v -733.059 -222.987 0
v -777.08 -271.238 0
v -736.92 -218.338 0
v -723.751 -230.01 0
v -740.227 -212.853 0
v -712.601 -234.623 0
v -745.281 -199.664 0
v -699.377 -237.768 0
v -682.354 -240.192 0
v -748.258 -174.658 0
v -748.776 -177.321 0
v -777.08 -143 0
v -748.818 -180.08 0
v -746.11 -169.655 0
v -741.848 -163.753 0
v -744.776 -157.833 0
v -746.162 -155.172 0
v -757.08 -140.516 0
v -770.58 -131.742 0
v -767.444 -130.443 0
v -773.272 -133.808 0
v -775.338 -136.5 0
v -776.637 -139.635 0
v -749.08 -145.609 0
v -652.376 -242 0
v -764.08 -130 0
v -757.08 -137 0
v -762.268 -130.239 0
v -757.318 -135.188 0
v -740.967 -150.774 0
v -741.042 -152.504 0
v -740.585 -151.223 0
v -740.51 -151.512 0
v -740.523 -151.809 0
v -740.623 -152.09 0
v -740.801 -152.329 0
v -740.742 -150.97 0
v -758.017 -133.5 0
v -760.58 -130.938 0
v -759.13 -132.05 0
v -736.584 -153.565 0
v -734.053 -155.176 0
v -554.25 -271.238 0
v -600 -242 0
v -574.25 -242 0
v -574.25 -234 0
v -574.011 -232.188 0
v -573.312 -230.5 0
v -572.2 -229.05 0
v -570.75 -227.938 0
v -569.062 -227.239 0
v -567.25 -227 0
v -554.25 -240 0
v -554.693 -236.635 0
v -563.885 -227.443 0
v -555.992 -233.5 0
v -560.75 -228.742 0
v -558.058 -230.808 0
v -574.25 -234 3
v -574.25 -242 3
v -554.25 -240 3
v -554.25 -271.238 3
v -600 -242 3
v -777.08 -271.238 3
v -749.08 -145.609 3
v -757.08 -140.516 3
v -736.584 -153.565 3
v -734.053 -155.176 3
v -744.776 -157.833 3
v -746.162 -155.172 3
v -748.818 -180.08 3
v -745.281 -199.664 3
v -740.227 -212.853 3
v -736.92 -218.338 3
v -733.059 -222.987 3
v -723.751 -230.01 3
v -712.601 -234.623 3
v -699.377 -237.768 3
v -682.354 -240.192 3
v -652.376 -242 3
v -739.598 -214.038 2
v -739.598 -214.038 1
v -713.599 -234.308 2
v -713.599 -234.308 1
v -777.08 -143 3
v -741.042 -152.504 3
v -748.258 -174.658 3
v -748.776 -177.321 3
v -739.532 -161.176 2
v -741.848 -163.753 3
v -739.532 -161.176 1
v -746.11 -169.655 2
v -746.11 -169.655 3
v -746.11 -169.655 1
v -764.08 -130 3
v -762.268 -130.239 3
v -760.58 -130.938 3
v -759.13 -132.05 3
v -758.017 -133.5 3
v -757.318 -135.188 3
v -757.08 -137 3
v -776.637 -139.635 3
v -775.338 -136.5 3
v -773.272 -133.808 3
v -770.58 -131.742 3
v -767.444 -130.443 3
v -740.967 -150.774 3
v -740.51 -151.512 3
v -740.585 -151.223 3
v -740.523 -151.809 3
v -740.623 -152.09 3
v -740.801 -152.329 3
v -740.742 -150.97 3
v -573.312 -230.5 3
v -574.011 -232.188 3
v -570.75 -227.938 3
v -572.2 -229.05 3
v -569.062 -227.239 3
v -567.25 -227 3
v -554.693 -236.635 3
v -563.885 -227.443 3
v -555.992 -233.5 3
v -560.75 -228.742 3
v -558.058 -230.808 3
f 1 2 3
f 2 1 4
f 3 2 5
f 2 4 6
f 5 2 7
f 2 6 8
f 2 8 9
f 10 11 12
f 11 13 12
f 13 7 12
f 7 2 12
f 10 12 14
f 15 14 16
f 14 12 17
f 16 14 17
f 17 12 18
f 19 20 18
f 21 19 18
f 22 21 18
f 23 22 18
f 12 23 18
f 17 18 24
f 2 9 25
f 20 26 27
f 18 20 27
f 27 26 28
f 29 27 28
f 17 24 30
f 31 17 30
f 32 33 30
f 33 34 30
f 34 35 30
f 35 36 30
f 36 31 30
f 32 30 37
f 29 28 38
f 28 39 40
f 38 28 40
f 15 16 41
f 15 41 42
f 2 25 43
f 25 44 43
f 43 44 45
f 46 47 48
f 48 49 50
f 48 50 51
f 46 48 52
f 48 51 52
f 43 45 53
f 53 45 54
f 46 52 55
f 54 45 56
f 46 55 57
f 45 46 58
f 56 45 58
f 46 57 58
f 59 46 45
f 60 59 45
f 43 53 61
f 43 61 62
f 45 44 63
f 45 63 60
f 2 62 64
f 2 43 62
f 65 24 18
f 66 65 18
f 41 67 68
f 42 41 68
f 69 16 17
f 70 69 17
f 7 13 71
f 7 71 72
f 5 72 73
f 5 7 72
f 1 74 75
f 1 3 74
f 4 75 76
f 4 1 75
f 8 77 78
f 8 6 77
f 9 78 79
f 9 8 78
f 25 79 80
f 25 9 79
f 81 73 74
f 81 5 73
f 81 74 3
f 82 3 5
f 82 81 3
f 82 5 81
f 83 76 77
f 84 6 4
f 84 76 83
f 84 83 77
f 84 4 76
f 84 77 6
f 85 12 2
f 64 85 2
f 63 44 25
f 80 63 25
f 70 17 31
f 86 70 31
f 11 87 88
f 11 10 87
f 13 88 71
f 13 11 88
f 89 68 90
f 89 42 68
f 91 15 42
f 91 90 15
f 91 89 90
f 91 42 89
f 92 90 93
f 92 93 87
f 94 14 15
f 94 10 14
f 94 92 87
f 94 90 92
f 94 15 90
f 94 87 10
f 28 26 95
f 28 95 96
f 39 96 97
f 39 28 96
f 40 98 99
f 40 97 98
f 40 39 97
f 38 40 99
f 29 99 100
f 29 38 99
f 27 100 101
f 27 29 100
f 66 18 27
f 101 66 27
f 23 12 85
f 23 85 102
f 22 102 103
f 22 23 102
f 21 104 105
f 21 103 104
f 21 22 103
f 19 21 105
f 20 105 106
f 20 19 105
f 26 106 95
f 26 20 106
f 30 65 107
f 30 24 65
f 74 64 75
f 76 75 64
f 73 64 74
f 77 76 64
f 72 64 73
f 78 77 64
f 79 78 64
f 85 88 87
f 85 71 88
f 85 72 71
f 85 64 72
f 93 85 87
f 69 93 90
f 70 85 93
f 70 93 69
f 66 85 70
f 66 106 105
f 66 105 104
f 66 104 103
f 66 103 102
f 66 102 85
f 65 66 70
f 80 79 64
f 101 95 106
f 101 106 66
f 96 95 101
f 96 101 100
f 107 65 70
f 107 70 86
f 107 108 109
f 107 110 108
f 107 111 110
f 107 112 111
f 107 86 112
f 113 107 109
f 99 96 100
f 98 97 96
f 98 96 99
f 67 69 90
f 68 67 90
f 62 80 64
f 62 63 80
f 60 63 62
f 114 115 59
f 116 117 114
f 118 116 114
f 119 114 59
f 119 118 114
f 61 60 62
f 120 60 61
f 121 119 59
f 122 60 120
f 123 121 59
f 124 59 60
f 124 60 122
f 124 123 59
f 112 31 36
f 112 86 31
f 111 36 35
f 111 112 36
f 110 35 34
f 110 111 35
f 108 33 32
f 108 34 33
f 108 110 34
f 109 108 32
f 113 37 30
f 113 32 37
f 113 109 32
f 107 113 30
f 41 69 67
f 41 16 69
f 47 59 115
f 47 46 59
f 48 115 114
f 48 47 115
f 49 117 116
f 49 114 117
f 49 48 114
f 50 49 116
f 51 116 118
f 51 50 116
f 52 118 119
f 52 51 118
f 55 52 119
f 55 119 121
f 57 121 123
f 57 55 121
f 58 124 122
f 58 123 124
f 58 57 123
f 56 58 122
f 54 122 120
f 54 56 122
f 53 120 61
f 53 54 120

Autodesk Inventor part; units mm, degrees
ref_plane "YZ Plane" through (0, 0, 0) normal (1, 0, 0) x (0, 1, 0)
ref_plane "XZ Plane" through (0, 0, 0) normal (0, 1, 0) x (-1, 0, 0)
ref_plane "XY Plane" through (0, 0, 0) normal (0, 0, 1) x (1, 0, 0)
sketch "Sketch3" plane through (0, 0, 0) normal (0, 0, 1) x (1, 0, 0)
  circle A0 centre (368.0481, 50) radius 50 construction
  line L0 (368.0481, 0) -> (514.9541, 0) construction
  line L1 (368.0481, 50) -> (514.9541, 50) construction
  line L2 (368.0481, 100) -> (514.9541, 100) construction
  line L3 (368.0481, 50) -> (343.0481, 6.6987) construction
  line L4 (368.0481, 50) -> (324.7469, 25) construction
  line L5 (368.0481, 50) -> (324.7469, 75) construction
  line L6 (343.0481, 93.3013) -> (368.0481, 50) construction
  line L7 (393.0481, 93.3013) -> (368.0481, 50) construction
  line L8 (411.3494, 75) -> (368.0481, 50) construction
  line L9 (411.3494, 25) -> (368.0481, 50) construction
  line L10 (393.0481, 6.6987) -> (368.0481, 50) construction
  line L11 (368.0481, 0) -> (368.0481, 100) construction
  line L12 (418.0481, 50) -> (368.0481, 50) construction
  line L13 (341.8682, 0) -> (341.8682, 100) construction
  line L14 (315.6883, 0) -> (315.6883, 100) construction
  line L15 (289.5083, 0) -> (289.5083, 100) construction
  line L16 (263.3284, 0) -> (263.3284, 100) construction
  line L17 (237.1485, 0) -> (237.1485, 100) construction
  line L18 (210.9685, 0) -> (210.9685, 100) construction
  line L19 (184.7886, 0) -> (184.7886, 100) construction
  line L20 (158.6086, 0) -> (158.6086, 100) construction
  circle A1 centre (315.6883, 50) radius 50 construction
  circle A2 centre (341.8682, 50) radius 50 construction
  circle A3 centre (289.5083, 50) radius 50 construction
  circle A4 centre (263.3284, 50) radius 50 construction
  circle A5 centre (237.1485, 50) radius 50 construction
  circle A6 centre (210.9685, 50) radius 50 construction
  line L21 (393.0481, 6.6987) -> (514.9541, 6.6987) construction
  line L22 (411.3494, 25) -> (514.9541, 25) construction
  line L23 (411.3494, 75) -> (514.9541, 75) construction
  line L24 (411.3494, 75) -> (514.9541, 75) construction
  line L25 (393.0481, 93.3013) -> (514.9541, 93.3013) construction
  line L26 (358.9895, 75) -> (339.5083, 50) construction
  line L27 (339.5083, 50) -> (306.6297, 25) construction
  line L28 (306.6297, 25) -> (262.1485, 6.6987) construction
  line L29 (262.1485, 6.6987) -> (210.9685, 0) construction
  line L30 (105.4843, -12.0642) -> (105.4843, 125.3083) construction
  line L31 (25.75, 0) -> (25.75, 23)
  line L32 (45.75, 17) -> (45.75, -21.2379)
  arc A7 (32.75, 30) -> (25.75, 23) centre (32.75, 23) ccw
  arc A8 (45.75, 17) -> (32.75, 30) centre (32.75, 17) ccw
  line L33 (32.75, 17) -> (45.75, 17) construction
  line L34 (32.75, 17) -> (32.75, 30) construction
  arc A9 (0, 0) -> (8.875, -12.2379) centre (12.875, 0) ccw
  arc A10 (16.875, -12.2379) -> (25.75, 0) centre (12.875, 0) ccw
  line L35 (45.75, -21.2379) -> (16.875, -21.2379)
  line L36 (8.875, -21.2379) -> (-177.0796, -21.2379)
  circle A11 centre (-144.2046, 110.3653) radius 12.875 construction
  line L37 (8.875, -21.2379) -> (8.875, -12.2379)
  line L38 (16.875, -21.2379) -> (16.875, -12.2379)
  line L39 (411.3494, 75) -> (158.6086, 75) construction
  line L40 (368.0481, 100) -> (158.6086, 100) construction
  line L41 (418.0481, 50) -> (158.6086, 50) construction
  line L42 (411.3494, 25) -> (158.6086, 25) construction
  line L43 (393.0481, 6.6987) -> (158.6086, 6.6987) construction
  line L44 (393.0481, 93.3013) -> (158.6086, 93.3013) construction
  line L45 (358.9895, 75) -> (366.8682, 93.3013) construction
  line L46 (366.8682, 93.3013) -> (368.0481, 100) construction
  spline S0 degree 4 poles (-157.0796, 100) (-157.0796, 88.9946) (-147.011, 72.6811) (-131.8577, 48.7932) (-88.4777, 17.6268) (-50.0176, 3.937) (-18.8717, 0) (0, 0) knots 0 0 0 0 0 0.264547 0.457223 0.66608 1 1 1 1 1
  line L47 (-157.0796, 100) -> (-157.0796, 81.2146) construction
  line L48 (0, 0) -> (-42.8818, 0) construction
  line L49 (-157.0796, 100) -> (-157.0796, 113)
  line L50 (-144.2046, 110.3653) -> (-157.0796, 110.3653) construction
  line L51 (-147.6984, 94.0277) -> (-120.1158, 108.3975) construction
  line L52 (-157.0796, 100) -> (0, 0) construction
  circle A12 centre (-147.2046, 105.4197) radius 9.875 construction
  line L53 (-147.2046, 105.4197) -> (-157.0796, 105.4197) construction
  line L54 (-146.1623, 94.828) -> (-144.7762, 92.1674) construction
  line L55 (-144.7762, 92.1674) -> (-142.2689, 93.4736) construction
  line L56 (-177.0796, 107) -> (-177.0796, -21.2379)
  arc A13 (-157.0796, 113) -> (-164.0796, 120) centre (-164.0796, 113) ccw
  line L57 (-164.0796, 113) -> (-164.0796, 120) construction
  line L58 (-164.0796, 113) -> (-157.0796, 113) construction
  arc A14 (-164.0796, 120) -> (-177.0796, 107) centre (-164.0796, 107) ccw
  line L59 (-164.0796, 107) -> (-177.0796, 107) construction
  line L60 (-164.0796, 107) -> (-164.0796, 120) construction
  line L61 (-457.0796, 100) -> (-300, 0)
  line L62 (-757.0796, 100) -> (-757.0796, 76.4376)
  line L63 (-600, 0) -> (-652.3765, 0)
  spline S1 degree 4 poles (-757.0796, 76.4376) (-757.0796, 65.0585) (-753.7776, 47.1407) (-745.4013, 7.8331) (-693.0053, 2.4317) (-668.8587, 0) (-652.3765, 0) knots 0 0 0 0 0 0.348765 0.598765 1 1 1 1 1
  line L64 (-477.0796, 107) -> (-477.0796, -21.2379)
  arc A15 (-464.0796, 120) -> (-477.0796, 107) centre (-464.0796, 107) ccw
  arc A16 (-457.0796, 113) -> (-464.0796, 120) centre (-464.0796, 113) ccw
  line L65 (-457.0796, 100) -> (-457.0796, 113)
  circle A17 centre (-447.2046, 105.4197) radius 9.875 construction
  circle A18 centre (-444.2046, 110.3653) radius 12.875 construction
  line L66 (-457.0796, 100) -> (-300, 0) construction
  line L67 (-447.6984, 94.0277) -> (-420.1158, 108.3975) construction
  line L68 (-444.7762, 92.1674) -> (-442.2689, 93.4736) construction
  line L69 (-446.1623, 94.828) -> (-444.7762, 92.1674) construction
  line L70 (-291.125, -21.2379) -> (-477.0796, -21.2379)
  arc A19 (-300, 0) -> (-291.125, -12.2379) centre (-287.125, 0) ccw
  line L71 (-291.125, -21.2379) -> (-291.125, -12.2379)
  line L72 (-283.125, -21.2379) -> (-283.125, -12.2379)
  arc A20 (-283.125, -12.2379) -> (-274.25, 0) centre (-287.125, 0) ccw
  line L73 (-254.25, -21.2379) -> (-283.125, -21.2379)
  line L74 (-254.25, 17) -> (-254.25, -21.2379)
  line L75 (-274.25, 0) -> (-274.25, 23)
  arc A21 (-267.25, 30) -> (-274.25, 23) centre (-267.25, 23) ccw
  arc A22 (-254.25, 17) -> (-267.25, 30) centre (-267.25, 17) ccw
  line L76 (-777.0796, 107) -> (-777.0796, -21.2379)
  arc A23 (-764.0796, 120) -> (-777.0796, 107) centre (-764.0796, 107) ccw
  arc A24 (-757.0796, 113) -> (-764.0796, 120) centre (-764.0796, 113) ccw
  line L77 (-757.0796, 100) -> (-757.0796, 113)
  circle A25 centre (-747.2046, 105.4197) radius 9.875 construction
  circle A26 centre (-744.2046, 110.3653) radius 12.875 construction
  line L78 (-757.0796, 100) -> (-600, 0) construction
  line L79 (-747.6984, 94.0277) -> (-720.1158, 108.3975) construction
  line L80 (-744.7762, 92.1674) -> (-742.2689, 93.4736) construction
  line L81 (-746.1623, 94.828) -> (-744.7762, 92.1674) construction
  line L82 (-591.125, -21.2379) -> (-777.0796, -21.2379)
  arc A27 (-600, 0) -> (-591.125, -12.2379) centre (-587.125, 0) ccw
  line L83 (-591.125, -21.2379) -> (-591.125, -12.2379)
  line L84 (-583.125, -21.2379) -> (-583.125, -12.2379)
  arc A28 (-583.125, -12.2379) -> (-574.25, 0) centre (-587.125, 0) ccw
  line L85 (-554.25, -21.2379) -> (-583.125, -21.2379)
  line L86 (-554.25, 17) -> (-554.25, -21.2379)
  line L87 (-574.25, 0) -> (-574.25, 23)
  arc A29 (-567.25, 30) -> (-574.25, 23) centre (-567.25, 23) ccw
  arc A30 (-554.25, 17) -> (-567.25, 30) centre (-567.25, 17) ccw
  line L88 (32.75, -233) -> (45.75, -233) construction
  line L89 (32.75, -233) -> (32.75, -220) construction
  arc A31 (45.75, -233) -> (32.75, -220) centre (32.75, -233) ccw construction
  line L90 (25.75, -250) -> (25.75, -227) construction
  line L91 (45.75, -233) -> (45.75, -271.2379) construction
  arc A32 (16.875, -262.2379) -> (25.75, -250) centre (12.875, -250) ccw construction
  line L92 (45.75, -271.2379) -> (16.875, -271.2379) construction
  arc A33 (0, -250) -> (8.875, -262.2379) centre (12.875, -250) ccw construction
  arc A34 (32.75, -220) -> (25.75, -227) centre (32.75, -227) ccw construction
  line L93 (8.875, -271.2379) -> (-177.0796, -271.2379) construction
  line L94 (-157.0796, -150) -> (0, -250) construction
  spline S2 degree 4 poles (-157.0796, -150) (-157.0796, -161.0054) (-147.011, -177.3189) (-131.8577, -201.2068) (-88.4777, -232.3732) (-50.0176, -246.063) (-18.8717, -250) (0, -250) knots 0 0 0 0 0 0.264547 0.457223 0.66608 1 1 1 1 1 construction
  line L95 (-177.0796, -143) -> (-177.0796, -271.2379)
  line L96 (-146.1623, -155.172) -> (-144.7762, -157.8326) construction
  line L97 (-144.7762, -157.8326) -> (-142.2689, -156.5264) construction
  line L98 (-147.6984, -155.9723) -> (-120.1158, -141.6025) construction
  line L99 (-157.0796, -150) -> (-157.0796, -168.7854) construction
  line L100 (-147.2046, -144.5803) -> (-157.0796, -144.5803) construction
  line L101 (-144.2046, -139.6347) -> (-157.0796, -139.6347) construction
  circle A35 centre (-147.2046, -144.5803) radius 9.875 construction
  line L102 (0, -250) -> (-42.8818, -250) construction
  line L103 (16.875, -271.2379) -> (16.875, -262.2379) construction
  line L104 (8.875, -271.2379) -> (8.875, -262.2379) construction
  circle A36 centre (-144.2046, -139.6347) radius 12.875 construction
  line L105 (-164.0796, -143) -> (-177.0796, -143) construction
  line L106 (-157.0796, -150) -> (-157.0796, -137) construction
  line L107 (-164.0796, -137) -> (-157.0796, -137) construction
  arc A37 (-157.0796, -137) -> (-164.0796, -130) centre (-164.0796, -137) ccw
  line L108 (-164.0796, -137) -> (-164.0796, -130) construction
  line L109 (-164.0796, -143) -> (-164.0796, -130) construction
  arc A38 (-164.0796, -130) -> (-177.0796, -143) centre (-164.0796, -143) ccw
  arc A39 (32.75, -227) -> (25.75, -234) centre (32.75, -234) ccw
  line L110 (32.75, -234) -> (25.75, -234) construction
  line L111 (32.75, -234) -> (32.75, -227) construction
  line L112 (45.75, -271.2379) -> (-177.0796, -271.2379)
  arc A40 (45.75, -240) -> (32.75, -227) centre (32.75, -240) ccw
  line L113 (32.75, -240) -> (45.75, -240) construction
  line L114 (32.75, -240) -> (32.75, -227) construction
  line L115 (45.75, -240) -> (45.75, -271.2379)
  line L116 (0, -242) -> (25.75, -242)
  line L117 (25.75, -234) -> (25.75, -242)
  line L118 (-149.0796, -145.6094) -> (-149.0796, -150)
  line L119 (-149.0796, -145.6094) -> (-157.0796, -140.5164)
  line L120 (-157.0796, -140.5164) -> (-157.0796, -137)
  line L121 (57.9242, -250) -> (-50.1018, -250) construction
  spline S3 degree 4 poles (-149.0796, -150) (-149.0796, -154.1011) (-147.2668, -159.7716) (-135.8793, -178.0796) (-120.229, -197.0865) (-83.3361, -225.9308) (-47.2959, -235.9761) (-18.0598, -242) (0, -242) knots 0 0 0 0 0 0.173174 0.31592 0.488873 0.682943 1 1 1 1 1
  line L122 (-158.9844, -148.7874) -> (-160.5796, -147.7718) construction
  line L123 (-149.0796, -145.6094) -> (2.3304, -242) construction
  line L124 (-149.0796, -145.6094) -> (-139.5059, -151.7042)
  line L125 (-146.1623, -155.172) -> (-139.5059, -151.7042)
  line L126 (-144.7762, -157.8326) -> (-146.1623, -155.172)
  line L127 (-144.7762, -157.8326) -> (-136.5837, -153.5646)
  line L128 (-136.5837, -153.5646) -> (-134.053, -155.1756)
  line L129 (-136.5837, -153.5646) -> (-136.7042, -153.7538) construction
  line L130 (-134.053, -155.1756) -> (-134.1481, -155.3251) construction
  spline S4 degree 4 poles (-134.053, -155.1756) (-136.3893, -157.4676) (-136.0613, -162.1246) (-140.7447, -169.8773) (-137.1035, -175.12) knots 0 0 0 0 0 1 1 1 1 1
  line L131 (-134.053, -155.1756) -> (-131.4385, -154.0999) construction
  line L132 (-254.25, -271.2379) -> (-477.0796, -271.2379)
  line L133 (-477.0796, -143) -> (-477.0796, -271.2379)
  arc A41 (-464.0796, -130) -> (-477.0796, -143) centre (-464.0796, -143) ccw
  arc A42 (-457.0796, -137) -> (-464.0796, -130) centre (-464.0796, -137) ccw
  line L134 (-457.0796, -140.5164) -> (-457.0796, -137)
  line L135 (-449.0796, -145.6094) -> (-457.0796, -140.5164)
  line L136 (-449.0796, -145.6094) -> (-439.5059, -151.7042)
  line L137 (-446.1623, -155.172) -> (-439.5059, -151.7042)
  line L138 (-444.7762, -157.8326) -> (-446.1623, -155.172)
  line L139 (-444.7762, -157.8326) -> (-436.5837, -153.5646)
  line L140 (-436.5837, -153.5646) -> (-434.053, -155.1756)
  line L141 (-449.0796, -145.6094) -> (-297.6696, -242) construction
  line L142 (-300, -242) -> (-274.25, -242)
  line L143 (-274.25, -234) -> (-274.25, -242)
  arc A43 (-267.25, -227) -> (-274.25, -234) centre (-267.25, -234) ccw
  arc A44 (-254.25, -240) -> (-267.25, -227) centre (-267.25, -240) ccw
  line L144 (-254.25, -240) -> (-254.25, -271.2379)
  circle A45 centre (-447.2046, -144.5803) radius 9.875 construction
  line L145 (-457.0796, -150) -> (-300, -250) construction
  circle A46 centre (-444.2046, -139.6347) radius 12.875 construction
  line L146 (-554.25, -271.2379) -> (-777.0796, -271.2379)
  line L147 (-777.0796, -143) -> (-777.0796, -271.2379)
  arc A47 (-764.0796, -130) -> (-777.0796, -143) centre (-764.0796, -143) ccw
  arc A48 (-757.0796, -137) -> (-764.0796, -130) centre (-764.0796, -137) ccw
  line L148 (-757.0796, -140.5164) -> (-757.0796, -137)
  line L149 (-749.0796, -145.6094) -> (-757.0796, -140.5164)
  line L150 (-749.0796, -145.6094) -> (-739.5059, -151.7042)
  line L151 (-746.1623, -155.172) -> (-739.5059, -151.7042)
  line L152 (-744.7762, -157.8326) -> (-746.1623, -155.172)
  line L153 (-744.7762, -157.8326) -> (-736.5837, -153.5646)
  line L154 (-736.5837, -153.5646) -> (-734.053, -155.1756)
  line L155 (-749.0796, -145.6094) -> (-597.6696, -242) construction
  line L156 (-600, -242) -> (-574.25, -242)
  line L157 (-574.25, -234) -> (-574.25, -242)
  arc A49 (-567.25, -227) -> (-574.25, -234) centre (-567.25, -234) ccw
  arc A50 (-554.25, -240) -> (-567.25, -227) centre (-567.25, -240) ccw
  line L158 (-554.25, -240) -> (-554.25, -271.2379)
  circle A51 centre (-747.2046, -144.5803) radius 9.875 construction
  line L159 (-757.0796, -150) -> (-600, -250) construction
  circle A52 centre (-744.2046, -139.6347) radius 12.875 construction
  line L160 (-297.6696, -242) -> (-434.053, -155.1756)
  spline S5 degree 4 poles (-757.0796, -173.5624) (-757.0796, -184.9415) (-753.7776, -202.8593) (-745.4013, -242.1669) (-693.0053, -247.5683) (-668.8587, -250) (-652.3765, -250) knots 0 0 0 0 0 0.348765 0.598765 1 1 1 1 1 construction
  line L161 (-757.0796, -150) -> (-757.0796, -173.5624)
  line L162 (-600, -250) -> (-652.3765, -250) construction
  line L163 (-600, -242) -> (-652.3765, -242)
  spline S6 degree 4 poles (-749.0796, -173.5624) (-749.0796, -183.7991) (-746.0176, -199.7502) (-737.9559, -236.335) (-690.8375, -239.2991) (-667.8077, -242) (-652.3765, -242) knots 0 0 0 0 0 0.346383 0.596383 1 1 1 1 1
  line L164 (-749.0796, -173.5624) -> (-749.0796, -170.035) construction
  spline S7 degree 3 poles (-734.053, -155.1756) (-737.3254, -159.7583) (-749.7015, -168.859) (-748.818, -180.0805) knots 0 0 0 0 1 1 1 1
  point P0 (158.6086, 0)
  point P1 (-148.021, 75)
  point P2 (-128.5398, 50)
  point P3 (-95.6611, 25)
  point P4 (-51.1799, 6.6987)
  point P5 (-155.8997, 93.3013)
  point P6 (-753.2027, 48.1984)
  point P7 (-737.7866, 19.9116)
  point P8 (-697.6619, 3.8098)
  point P9 (-457.0796, 110.3653)
  point P10 (-457.0796, 105.4197)
  point P11 (-757.0796, 110.3653)
  point P12 (-757.0796, 105.4197)
  point P13 (-51.1799, -243.3013)
  point P14 (-95.6611, -225)
  point P15 (-148.021, -175)
  point P16 (-128.5398, -200)
  point P17 (-155.8997, -156.6987)
  point P18 (-157.0796, -141.4334)
  point P19 (-153.0796, -143.0629)
  point P20 (-152.1421, -144.5803)
  point P21 (3.9112, -250)
  point P22 (-147.2046, -158.2164)
  point P23 (-137.7547, -174.1759)
  point P24 (-121.904, -193.5196)
  point P25 (-91.5665, -216.9339)
  point P26 (-48.8291, -234.4712)
  point P27 (-135.7448, -158.2544)
  point P28 (-137.814, -165.5952)
  point P29 (-453.0796, -143.0629)
  point P30 (-457.0796, -144.5803)
  point P31 (-447.6984, -155.9723)
  point P32 (-457.0796, -139.6347)
  point P33 (-753.0796, -143.0629)
  point P34 (-757.0796, -144.5803)
  point P35 (-747.6984, -155.9723)
  point P36 (-757.0796, -139.6347)
  point P37 (-753.2027, -201.8016)
  point P38 (-737.7866, -230.0884)
  point P39 (-697.6619, -246.1902)
  point P40 (-745.4939, -198.9007)
  point P41 (-731.3987, -224.5882)
  point P42 (-695.3384, -238.4632)
  point P43 (-741.9622, -163.8871)
  point P44 (-300, 0)
  dimension "d43" = 25.75
  dimension "d53" = 19.75
  dimension "diameter" = 100
  dimension "d8" = 26.1799
  dimension "d14" = 30
  dimension "d15" = 30
  dimension "d16" = 30
  dimension "d26" = 90
  dimension "stopper" = 30
  dimension "stopperthickness" = 20
  dimension "d32" = 12.875
  dimension "d33" = 12.875
  dimension "d38" = 6
  dimension "d47" = 8
  dimension "d49" = 9
  dimension "d55" = 120
  dimension "d56" = 3
  dimension "d57" = 90
  dimension "d58" = 90
  dimension "d59" = 20
  dimension "d60" = 6
  dimension "d61" = 20
  dimension "d62" = 28.875
  dimension "d72" = 300
  dimension "d93" = 250
  dimension "d98" = 90
  dimension "d99" = 44.2379
  dimension "d100" = 37.2379
  dimension "d101" = 90
  dimension "railheight" = 8
  dimension "d104" = 8
  dimension "d105" = 8
  dimension "d106" = 3
  dimension "d109" = 300
  dimension "d116" = 250
  dimension "d121" = 8
extrude "Extrusion1" add sketch "Sketch3" along normal blind 3 contours L146 L147 A47 A48 L148 L149 L150 L151 L152 L153 L154 S7 S6 L163 L156 L157 A49 A50 L158
fillet "Fillet2" radius 1 1 edges at (-739.5059, -151.7042, 1.5)
equation "\"d8\" = 0.261799 * diameter"
properties part number "steep-rail"
